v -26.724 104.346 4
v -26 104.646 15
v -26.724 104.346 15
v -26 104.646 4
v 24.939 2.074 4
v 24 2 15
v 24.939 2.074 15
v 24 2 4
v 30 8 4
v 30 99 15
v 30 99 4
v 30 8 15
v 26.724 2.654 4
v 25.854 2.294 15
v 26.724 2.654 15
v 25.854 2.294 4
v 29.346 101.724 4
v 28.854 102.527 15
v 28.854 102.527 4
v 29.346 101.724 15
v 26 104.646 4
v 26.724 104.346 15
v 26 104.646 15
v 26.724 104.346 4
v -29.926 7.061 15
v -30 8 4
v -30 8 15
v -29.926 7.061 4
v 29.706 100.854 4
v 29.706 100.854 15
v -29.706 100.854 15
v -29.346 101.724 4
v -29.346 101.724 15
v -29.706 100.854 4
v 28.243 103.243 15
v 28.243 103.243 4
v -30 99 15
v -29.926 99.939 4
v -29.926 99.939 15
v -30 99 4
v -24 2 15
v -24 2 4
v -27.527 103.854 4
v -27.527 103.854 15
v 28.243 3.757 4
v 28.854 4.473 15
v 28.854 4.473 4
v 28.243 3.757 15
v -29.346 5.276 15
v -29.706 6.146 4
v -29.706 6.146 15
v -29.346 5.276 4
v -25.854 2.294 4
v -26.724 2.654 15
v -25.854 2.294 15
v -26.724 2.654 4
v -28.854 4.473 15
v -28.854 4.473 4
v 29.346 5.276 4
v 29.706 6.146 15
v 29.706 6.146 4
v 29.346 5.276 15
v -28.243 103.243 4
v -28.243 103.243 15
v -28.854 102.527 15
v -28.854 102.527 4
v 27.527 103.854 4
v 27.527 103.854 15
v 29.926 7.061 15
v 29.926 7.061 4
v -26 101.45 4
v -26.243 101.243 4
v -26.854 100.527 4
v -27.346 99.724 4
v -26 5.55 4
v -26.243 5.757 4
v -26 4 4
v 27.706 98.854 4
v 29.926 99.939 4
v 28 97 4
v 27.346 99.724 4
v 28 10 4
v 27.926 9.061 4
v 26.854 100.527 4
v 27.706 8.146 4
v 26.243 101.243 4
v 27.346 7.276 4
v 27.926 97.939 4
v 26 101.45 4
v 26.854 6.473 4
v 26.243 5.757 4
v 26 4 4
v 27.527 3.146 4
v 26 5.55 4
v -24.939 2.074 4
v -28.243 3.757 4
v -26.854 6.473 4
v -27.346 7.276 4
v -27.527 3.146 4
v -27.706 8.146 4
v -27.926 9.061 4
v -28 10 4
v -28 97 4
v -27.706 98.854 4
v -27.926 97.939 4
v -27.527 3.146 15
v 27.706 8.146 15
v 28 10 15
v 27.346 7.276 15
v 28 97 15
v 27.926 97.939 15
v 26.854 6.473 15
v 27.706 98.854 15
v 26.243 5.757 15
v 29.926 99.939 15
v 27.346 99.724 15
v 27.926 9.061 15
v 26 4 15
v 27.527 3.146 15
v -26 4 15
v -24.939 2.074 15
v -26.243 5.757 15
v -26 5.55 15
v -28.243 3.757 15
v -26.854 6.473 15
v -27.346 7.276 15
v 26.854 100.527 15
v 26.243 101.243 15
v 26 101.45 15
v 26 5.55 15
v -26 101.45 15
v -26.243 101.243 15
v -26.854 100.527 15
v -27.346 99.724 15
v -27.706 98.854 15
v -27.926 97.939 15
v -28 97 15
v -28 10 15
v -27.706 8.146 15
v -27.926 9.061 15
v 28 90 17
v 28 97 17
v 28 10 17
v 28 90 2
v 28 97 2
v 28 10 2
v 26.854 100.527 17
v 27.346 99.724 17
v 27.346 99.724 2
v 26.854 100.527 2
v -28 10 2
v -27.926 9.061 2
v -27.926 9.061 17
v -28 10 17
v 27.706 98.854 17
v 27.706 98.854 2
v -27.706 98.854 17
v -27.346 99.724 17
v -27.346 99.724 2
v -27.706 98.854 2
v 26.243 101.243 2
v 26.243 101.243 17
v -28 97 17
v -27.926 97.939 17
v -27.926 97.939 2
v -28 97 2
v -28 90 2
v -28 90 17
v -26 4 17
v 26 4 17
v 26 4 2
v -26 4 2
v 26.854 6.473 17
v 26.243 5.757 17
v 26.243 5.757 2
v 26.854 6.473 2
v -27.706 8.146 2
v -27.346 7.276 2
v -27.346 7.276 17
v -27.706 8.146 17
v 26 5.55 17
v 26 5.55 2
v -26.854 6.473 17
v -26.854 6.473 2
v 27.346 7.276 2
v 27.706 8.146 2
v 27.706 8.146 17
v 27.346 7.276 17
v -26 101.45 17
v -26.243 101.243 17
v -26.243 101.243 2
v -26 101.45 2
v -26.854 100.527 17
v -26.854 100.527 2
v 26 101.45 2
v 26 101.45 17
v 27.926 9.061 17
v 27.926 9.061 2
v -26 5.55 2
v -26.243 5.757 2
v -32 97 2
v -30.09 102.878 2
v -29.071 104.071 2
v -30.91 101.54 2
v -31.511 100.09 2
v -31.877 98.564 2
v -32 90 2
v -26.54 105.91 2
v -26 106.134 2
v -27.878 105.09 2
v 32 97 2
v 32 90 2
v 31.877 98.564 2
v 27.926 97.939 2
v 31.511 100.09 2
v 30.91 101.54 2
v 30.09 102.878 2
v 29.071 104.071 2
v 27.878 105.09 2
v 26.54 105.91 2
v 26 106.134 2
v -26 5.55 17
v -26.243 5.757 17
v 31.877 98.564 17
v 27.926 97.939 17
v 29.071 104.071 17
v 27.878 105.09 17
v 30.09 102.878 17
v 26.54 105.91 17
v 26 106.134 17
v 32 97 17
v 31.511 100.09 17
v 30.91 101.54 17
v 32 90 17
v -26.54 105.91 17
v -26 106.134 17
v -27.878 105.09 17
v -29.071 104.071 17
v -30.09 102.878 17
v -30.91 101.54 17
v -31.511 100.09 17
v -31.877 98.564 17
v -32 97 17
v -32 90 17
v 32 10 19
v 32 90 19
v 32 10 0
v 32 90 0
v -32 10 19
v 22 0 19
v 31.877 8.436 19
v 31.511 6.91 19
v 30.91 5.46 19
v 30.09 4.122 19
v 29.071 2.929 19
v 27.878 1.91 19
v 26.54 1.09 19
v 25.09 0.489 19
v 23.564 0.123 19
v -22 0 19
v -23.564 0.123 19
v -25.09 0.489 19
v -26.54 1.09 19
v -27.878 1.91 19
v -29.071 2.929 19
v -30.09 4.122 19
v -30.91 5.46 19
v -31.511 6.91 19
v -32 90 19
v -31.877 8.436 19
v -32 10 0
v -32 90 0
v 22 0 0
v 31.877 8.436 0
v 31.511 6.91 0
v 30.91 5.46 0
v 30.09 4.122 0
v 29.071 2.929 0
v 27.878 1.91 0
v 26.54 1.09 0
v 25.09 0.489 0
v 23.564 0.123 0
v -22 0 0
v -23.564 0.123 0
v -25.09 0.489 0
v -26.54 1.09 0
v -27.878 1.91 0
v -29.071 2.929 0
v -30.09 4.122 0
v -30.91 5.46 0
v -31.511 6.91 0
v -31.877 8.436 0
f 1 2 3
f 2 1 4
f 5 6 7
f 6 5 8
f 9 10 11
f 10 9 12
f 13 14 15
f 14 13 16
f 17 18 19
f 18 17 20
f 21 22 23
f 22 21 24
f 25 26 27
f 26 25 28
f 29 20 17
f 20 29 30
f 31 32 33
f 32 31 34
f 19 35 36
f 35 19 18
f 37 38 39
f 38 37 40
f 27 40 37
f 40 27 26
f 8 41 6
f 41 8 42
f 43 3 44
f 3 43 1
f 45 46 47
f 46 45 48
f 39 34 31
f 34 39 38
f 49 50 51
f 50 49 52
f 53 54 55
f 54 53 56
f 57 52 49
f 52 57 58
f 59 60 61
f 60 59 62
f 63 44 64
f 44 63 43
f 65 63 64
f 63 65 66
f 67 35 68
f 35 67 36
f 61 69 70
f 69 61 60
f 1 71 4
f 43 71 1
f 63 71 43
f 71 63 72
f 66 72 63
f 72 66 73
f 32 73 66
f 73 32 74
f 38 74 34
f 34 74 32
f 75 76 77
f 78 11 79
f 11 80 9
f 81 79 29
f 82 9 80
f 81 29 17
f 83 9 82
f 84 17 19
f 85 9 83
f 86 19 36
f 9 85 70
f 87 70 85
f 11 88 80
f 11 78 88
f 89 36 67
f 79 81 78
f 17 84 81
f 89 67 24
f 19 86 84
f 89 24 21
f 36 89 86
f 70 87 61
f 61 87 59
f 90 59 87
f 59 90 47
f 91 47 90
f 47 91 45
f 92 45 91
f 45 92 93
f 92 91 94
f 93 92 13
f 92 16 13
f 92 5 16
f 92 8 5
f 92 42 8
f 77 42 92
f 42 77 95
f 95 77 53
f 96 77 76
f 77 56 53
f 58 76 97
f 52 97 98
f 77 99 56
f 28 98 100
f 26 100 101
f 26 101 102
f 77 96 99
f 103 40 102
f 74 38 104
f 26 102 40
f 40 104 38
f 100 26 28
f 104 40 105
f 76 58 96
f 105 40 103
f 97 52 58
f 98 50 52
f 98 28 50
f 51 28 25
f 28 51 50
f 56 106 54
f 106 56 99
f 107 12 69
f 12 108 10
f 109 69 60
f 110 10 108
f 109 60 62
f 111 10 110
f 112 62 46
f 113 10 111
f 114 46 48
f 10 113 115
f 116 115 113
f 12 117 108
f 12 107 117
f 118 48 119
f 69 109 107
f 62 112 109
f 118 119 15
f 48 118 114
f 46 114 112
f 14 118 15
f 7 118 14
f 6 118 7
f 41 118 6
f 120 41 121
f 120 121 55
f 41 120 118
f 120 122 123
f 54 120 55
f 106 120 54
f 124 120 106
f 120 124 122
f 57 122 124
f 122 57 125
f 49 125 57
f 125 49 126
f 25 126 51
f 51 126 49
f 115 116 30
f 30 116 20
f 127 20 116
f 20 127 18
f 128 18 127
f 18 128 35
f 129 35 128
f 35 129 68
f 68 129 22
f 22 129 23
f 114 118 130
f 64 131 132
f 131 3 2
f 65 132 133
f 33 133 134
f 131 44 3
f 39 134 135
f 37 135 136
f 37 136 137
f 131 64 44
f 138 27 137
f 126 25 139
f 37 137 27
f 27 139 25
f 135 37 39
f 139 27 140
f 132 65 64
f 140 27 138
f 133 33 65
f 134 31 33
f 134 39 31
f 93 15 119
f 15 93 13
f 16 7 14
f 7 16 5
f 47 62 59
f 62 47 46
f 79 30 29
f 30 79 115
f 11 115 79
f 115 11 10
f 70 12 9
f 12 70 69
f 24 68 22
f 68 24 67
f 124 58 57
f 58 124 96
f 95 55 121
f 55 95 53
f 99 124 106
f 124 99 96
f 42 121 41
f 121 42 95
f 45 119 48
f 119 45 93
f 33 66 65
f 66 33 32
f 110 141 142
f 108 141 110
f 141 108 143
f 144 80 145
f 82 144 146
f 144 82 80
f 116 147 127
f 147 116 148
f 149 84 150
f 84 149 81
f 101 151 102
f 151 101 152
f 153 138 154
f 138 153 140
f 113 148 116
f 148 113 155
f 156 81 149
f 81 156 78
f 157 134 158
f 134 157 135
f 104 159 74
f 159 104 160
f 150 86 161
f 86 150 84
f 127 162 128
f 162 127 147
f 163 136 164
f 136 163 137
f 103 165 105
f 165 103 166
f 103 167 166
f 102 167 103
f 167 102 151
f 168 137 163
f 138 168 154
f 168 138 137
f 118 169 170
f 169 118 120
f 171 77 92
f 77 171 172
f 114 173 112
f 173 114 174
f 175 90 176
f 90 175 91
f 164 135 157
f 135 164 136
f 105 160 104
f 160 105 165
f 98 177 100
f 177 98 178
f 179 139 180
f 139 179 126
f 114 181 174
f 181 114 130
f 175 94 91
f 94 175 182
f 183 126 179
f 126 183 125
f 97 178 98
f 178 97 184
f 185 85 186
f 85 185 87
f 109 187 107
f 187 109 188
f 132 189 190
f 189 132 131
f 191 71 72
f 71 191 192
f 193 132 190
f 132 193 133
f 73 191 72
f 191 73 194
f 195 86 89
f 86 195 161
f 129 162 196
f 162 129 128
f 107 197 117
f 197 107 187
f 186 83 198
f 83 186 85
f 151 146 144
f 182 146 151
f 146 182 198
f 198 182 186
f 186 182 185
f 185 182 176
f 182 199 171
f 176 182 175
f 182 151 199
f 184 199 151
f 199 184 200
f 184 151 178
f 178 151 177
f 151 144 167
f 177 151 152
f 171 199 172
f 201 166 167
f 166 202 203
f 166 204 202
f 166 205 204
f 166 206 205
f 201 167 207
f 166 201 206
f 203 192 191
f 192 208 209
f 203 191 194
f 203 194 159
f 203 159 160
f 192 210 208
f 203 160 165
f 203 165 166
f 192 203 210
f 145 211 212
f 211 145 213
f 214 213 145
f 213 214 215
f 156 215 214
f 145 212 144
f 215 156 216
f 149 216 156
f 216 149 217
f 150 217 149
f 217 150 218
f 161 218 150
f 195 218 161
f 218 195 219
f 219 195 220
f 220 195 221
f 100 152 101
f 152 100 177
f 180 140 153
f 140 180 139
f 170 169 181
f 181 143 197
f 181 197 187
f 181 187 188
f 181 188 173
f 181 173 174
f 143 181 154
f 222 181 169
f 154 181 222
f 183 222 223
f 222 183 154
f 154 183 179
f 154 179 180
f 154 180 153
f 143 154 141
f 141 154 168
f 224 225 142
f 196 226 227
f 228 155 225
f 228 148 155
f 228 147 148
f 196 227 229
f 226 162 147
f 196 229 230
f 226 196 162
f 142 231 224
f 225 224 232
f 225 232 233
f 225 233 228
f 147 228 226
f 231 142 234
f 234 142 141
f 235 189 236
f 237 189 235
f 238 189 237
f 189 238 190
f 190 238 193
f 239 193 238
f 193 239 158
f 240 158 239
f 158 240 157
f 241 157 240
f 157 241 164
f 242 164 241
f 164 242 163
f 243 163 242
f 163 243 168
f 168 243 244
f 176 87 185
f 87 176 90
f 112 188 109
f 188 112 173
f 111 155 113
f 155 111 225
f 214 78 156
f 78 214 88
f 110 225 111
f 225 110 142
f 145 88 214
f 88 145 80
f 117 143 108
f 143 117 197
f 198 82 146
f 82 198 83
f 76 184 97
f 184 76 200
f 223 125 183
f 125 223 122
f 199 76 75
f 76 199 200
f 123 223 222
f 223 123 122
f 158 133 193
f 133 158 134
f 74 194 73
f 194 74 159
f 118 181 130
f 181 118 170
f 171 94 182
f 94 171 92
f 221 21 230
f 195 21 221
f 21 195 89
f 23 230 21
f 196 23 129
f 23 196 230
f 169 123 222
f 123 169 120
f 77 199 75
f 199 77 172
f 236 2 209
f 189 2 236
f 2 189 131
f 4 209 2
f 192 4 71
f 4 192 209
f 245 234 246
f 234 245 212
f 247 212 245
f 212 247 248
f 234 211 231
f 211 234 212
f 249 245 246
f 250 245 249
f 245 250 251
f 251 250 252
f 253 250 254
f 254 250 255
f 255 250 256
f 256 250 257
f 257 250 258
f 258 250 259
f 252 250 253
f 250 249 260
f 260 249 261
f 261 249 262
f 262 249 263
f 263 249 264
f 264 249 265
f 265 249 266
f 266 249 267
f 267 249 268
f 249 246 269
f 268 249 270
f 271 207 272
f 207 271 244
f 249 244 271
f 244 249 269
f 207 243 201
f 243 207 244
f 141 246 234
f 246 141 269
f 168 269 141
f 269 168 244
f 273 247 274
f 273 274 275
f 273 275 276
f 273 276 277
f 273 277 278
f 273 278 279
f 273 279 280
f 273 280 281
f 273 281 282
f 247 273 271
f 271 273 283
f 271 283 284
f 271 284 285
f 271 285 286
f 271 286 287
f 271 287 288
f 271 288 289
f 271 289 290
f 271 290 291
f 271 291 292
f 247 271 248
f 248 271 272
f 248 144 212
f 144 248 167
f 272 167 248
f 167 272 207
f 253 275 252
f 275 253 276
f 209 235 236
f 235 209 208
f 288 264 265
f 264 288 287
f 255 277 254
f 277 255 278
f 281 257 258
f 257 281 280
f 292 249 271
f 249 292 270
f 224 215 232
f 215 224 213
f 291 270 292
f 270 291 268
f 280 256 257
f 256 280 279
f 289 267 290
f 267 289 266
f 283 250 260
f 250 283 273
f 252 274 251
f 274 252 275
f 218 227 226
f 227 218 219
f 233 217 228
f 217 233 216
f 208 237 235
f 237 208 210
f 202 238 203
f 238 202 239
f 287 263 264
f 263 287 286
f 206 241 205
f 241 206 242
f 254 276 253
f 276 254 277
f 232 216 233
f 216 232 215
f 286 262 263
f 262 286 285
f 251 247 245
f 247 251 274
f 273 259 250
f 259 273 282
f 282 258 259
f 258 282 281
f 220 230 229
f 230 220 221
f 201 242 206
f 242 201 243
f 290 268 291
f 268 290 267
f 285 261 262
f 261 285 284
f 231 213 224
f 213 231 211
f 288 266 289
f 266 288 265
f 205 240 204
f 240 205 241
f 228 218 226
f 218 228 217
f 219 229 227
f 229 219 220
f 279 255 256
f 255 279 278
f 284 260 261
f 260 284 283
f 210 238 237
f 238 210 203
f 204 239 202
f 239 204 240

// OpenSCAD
height = 103;
bottom_width = 60;
top_width = 60;
thickness = 11;

bottom_round = 6;
top_round = 6;

ring_offset = 14.3;

skin = 2;

cover_height = 90;

opening_ratio = 1.0;

$fn=40;

difference() {
    fob(
        height = height + skin * 2, 
        bottom_width = bottom_width + skin * 2, 
        top_width = top_width + skin * 2,
        thickness = thickness + skin * 4,
        bottom_round = bottom_round + skin * 2,
        top_round = top_round + skin * 2
    );

    union() {
        translate([0, skin, skin * 2]) {
            fob(
                height = height, 
                bottom_width = bottom_width, 
                top_width = top_width,
                thickness = thickness,
                bottom_round = bottom_round,
                top_round = top_round
            );
        };
        translate([0, skin * 2, skin]) {
            fob(
                height = height - skin * 2,
                bottom_width = bottom_width - skin * 2,
                top_width = top_width - skin * 2,
                thickness = thickness + skin * 2,
                bottom_round = bottom_round,
                top_round = top_round
            );
        };
        translate([0 - bottom_width / 2 + skin * 2, skin * 2, skin]) {
            cube([
                bottom_width - skin * 4,
                height + skin * 2,
                thickness + skin * 2
            ]);
        };
        
        translate([
            0 - top_width / 2 - skin, 
            cover_height, 
            thickness + skin * 3
        ]) {
            cube([
                top_width + skin * 2,
                height + skin * 2 - cover_height, 
                skin
            ]); 
        };
        translate([
            0 - top_width / 2 - skin, 
            cover_height, 
            0
        ]) {
            cube([
                top_width + skin * 2,
                height + skin * 2 - cover_height, 
                skin
            ]); 
        };
    };
}


module fob() {
    linear_extrude(height = thickness) {
        minkowski() {
            polygon(points = [
                [0 - bottom_width / 2 + bottom_round, 0 + bottom_round], 
                [bottom_width / 2 - bottom_round, 0 + bottom_round], 
                [top_width / 2 - bottom_round, height - bottom_round], 
                [0 - top_width / 2 + bottom_round, height - bottom_round]
            ]);
            circle(bottom_round);
        };
    };
}
